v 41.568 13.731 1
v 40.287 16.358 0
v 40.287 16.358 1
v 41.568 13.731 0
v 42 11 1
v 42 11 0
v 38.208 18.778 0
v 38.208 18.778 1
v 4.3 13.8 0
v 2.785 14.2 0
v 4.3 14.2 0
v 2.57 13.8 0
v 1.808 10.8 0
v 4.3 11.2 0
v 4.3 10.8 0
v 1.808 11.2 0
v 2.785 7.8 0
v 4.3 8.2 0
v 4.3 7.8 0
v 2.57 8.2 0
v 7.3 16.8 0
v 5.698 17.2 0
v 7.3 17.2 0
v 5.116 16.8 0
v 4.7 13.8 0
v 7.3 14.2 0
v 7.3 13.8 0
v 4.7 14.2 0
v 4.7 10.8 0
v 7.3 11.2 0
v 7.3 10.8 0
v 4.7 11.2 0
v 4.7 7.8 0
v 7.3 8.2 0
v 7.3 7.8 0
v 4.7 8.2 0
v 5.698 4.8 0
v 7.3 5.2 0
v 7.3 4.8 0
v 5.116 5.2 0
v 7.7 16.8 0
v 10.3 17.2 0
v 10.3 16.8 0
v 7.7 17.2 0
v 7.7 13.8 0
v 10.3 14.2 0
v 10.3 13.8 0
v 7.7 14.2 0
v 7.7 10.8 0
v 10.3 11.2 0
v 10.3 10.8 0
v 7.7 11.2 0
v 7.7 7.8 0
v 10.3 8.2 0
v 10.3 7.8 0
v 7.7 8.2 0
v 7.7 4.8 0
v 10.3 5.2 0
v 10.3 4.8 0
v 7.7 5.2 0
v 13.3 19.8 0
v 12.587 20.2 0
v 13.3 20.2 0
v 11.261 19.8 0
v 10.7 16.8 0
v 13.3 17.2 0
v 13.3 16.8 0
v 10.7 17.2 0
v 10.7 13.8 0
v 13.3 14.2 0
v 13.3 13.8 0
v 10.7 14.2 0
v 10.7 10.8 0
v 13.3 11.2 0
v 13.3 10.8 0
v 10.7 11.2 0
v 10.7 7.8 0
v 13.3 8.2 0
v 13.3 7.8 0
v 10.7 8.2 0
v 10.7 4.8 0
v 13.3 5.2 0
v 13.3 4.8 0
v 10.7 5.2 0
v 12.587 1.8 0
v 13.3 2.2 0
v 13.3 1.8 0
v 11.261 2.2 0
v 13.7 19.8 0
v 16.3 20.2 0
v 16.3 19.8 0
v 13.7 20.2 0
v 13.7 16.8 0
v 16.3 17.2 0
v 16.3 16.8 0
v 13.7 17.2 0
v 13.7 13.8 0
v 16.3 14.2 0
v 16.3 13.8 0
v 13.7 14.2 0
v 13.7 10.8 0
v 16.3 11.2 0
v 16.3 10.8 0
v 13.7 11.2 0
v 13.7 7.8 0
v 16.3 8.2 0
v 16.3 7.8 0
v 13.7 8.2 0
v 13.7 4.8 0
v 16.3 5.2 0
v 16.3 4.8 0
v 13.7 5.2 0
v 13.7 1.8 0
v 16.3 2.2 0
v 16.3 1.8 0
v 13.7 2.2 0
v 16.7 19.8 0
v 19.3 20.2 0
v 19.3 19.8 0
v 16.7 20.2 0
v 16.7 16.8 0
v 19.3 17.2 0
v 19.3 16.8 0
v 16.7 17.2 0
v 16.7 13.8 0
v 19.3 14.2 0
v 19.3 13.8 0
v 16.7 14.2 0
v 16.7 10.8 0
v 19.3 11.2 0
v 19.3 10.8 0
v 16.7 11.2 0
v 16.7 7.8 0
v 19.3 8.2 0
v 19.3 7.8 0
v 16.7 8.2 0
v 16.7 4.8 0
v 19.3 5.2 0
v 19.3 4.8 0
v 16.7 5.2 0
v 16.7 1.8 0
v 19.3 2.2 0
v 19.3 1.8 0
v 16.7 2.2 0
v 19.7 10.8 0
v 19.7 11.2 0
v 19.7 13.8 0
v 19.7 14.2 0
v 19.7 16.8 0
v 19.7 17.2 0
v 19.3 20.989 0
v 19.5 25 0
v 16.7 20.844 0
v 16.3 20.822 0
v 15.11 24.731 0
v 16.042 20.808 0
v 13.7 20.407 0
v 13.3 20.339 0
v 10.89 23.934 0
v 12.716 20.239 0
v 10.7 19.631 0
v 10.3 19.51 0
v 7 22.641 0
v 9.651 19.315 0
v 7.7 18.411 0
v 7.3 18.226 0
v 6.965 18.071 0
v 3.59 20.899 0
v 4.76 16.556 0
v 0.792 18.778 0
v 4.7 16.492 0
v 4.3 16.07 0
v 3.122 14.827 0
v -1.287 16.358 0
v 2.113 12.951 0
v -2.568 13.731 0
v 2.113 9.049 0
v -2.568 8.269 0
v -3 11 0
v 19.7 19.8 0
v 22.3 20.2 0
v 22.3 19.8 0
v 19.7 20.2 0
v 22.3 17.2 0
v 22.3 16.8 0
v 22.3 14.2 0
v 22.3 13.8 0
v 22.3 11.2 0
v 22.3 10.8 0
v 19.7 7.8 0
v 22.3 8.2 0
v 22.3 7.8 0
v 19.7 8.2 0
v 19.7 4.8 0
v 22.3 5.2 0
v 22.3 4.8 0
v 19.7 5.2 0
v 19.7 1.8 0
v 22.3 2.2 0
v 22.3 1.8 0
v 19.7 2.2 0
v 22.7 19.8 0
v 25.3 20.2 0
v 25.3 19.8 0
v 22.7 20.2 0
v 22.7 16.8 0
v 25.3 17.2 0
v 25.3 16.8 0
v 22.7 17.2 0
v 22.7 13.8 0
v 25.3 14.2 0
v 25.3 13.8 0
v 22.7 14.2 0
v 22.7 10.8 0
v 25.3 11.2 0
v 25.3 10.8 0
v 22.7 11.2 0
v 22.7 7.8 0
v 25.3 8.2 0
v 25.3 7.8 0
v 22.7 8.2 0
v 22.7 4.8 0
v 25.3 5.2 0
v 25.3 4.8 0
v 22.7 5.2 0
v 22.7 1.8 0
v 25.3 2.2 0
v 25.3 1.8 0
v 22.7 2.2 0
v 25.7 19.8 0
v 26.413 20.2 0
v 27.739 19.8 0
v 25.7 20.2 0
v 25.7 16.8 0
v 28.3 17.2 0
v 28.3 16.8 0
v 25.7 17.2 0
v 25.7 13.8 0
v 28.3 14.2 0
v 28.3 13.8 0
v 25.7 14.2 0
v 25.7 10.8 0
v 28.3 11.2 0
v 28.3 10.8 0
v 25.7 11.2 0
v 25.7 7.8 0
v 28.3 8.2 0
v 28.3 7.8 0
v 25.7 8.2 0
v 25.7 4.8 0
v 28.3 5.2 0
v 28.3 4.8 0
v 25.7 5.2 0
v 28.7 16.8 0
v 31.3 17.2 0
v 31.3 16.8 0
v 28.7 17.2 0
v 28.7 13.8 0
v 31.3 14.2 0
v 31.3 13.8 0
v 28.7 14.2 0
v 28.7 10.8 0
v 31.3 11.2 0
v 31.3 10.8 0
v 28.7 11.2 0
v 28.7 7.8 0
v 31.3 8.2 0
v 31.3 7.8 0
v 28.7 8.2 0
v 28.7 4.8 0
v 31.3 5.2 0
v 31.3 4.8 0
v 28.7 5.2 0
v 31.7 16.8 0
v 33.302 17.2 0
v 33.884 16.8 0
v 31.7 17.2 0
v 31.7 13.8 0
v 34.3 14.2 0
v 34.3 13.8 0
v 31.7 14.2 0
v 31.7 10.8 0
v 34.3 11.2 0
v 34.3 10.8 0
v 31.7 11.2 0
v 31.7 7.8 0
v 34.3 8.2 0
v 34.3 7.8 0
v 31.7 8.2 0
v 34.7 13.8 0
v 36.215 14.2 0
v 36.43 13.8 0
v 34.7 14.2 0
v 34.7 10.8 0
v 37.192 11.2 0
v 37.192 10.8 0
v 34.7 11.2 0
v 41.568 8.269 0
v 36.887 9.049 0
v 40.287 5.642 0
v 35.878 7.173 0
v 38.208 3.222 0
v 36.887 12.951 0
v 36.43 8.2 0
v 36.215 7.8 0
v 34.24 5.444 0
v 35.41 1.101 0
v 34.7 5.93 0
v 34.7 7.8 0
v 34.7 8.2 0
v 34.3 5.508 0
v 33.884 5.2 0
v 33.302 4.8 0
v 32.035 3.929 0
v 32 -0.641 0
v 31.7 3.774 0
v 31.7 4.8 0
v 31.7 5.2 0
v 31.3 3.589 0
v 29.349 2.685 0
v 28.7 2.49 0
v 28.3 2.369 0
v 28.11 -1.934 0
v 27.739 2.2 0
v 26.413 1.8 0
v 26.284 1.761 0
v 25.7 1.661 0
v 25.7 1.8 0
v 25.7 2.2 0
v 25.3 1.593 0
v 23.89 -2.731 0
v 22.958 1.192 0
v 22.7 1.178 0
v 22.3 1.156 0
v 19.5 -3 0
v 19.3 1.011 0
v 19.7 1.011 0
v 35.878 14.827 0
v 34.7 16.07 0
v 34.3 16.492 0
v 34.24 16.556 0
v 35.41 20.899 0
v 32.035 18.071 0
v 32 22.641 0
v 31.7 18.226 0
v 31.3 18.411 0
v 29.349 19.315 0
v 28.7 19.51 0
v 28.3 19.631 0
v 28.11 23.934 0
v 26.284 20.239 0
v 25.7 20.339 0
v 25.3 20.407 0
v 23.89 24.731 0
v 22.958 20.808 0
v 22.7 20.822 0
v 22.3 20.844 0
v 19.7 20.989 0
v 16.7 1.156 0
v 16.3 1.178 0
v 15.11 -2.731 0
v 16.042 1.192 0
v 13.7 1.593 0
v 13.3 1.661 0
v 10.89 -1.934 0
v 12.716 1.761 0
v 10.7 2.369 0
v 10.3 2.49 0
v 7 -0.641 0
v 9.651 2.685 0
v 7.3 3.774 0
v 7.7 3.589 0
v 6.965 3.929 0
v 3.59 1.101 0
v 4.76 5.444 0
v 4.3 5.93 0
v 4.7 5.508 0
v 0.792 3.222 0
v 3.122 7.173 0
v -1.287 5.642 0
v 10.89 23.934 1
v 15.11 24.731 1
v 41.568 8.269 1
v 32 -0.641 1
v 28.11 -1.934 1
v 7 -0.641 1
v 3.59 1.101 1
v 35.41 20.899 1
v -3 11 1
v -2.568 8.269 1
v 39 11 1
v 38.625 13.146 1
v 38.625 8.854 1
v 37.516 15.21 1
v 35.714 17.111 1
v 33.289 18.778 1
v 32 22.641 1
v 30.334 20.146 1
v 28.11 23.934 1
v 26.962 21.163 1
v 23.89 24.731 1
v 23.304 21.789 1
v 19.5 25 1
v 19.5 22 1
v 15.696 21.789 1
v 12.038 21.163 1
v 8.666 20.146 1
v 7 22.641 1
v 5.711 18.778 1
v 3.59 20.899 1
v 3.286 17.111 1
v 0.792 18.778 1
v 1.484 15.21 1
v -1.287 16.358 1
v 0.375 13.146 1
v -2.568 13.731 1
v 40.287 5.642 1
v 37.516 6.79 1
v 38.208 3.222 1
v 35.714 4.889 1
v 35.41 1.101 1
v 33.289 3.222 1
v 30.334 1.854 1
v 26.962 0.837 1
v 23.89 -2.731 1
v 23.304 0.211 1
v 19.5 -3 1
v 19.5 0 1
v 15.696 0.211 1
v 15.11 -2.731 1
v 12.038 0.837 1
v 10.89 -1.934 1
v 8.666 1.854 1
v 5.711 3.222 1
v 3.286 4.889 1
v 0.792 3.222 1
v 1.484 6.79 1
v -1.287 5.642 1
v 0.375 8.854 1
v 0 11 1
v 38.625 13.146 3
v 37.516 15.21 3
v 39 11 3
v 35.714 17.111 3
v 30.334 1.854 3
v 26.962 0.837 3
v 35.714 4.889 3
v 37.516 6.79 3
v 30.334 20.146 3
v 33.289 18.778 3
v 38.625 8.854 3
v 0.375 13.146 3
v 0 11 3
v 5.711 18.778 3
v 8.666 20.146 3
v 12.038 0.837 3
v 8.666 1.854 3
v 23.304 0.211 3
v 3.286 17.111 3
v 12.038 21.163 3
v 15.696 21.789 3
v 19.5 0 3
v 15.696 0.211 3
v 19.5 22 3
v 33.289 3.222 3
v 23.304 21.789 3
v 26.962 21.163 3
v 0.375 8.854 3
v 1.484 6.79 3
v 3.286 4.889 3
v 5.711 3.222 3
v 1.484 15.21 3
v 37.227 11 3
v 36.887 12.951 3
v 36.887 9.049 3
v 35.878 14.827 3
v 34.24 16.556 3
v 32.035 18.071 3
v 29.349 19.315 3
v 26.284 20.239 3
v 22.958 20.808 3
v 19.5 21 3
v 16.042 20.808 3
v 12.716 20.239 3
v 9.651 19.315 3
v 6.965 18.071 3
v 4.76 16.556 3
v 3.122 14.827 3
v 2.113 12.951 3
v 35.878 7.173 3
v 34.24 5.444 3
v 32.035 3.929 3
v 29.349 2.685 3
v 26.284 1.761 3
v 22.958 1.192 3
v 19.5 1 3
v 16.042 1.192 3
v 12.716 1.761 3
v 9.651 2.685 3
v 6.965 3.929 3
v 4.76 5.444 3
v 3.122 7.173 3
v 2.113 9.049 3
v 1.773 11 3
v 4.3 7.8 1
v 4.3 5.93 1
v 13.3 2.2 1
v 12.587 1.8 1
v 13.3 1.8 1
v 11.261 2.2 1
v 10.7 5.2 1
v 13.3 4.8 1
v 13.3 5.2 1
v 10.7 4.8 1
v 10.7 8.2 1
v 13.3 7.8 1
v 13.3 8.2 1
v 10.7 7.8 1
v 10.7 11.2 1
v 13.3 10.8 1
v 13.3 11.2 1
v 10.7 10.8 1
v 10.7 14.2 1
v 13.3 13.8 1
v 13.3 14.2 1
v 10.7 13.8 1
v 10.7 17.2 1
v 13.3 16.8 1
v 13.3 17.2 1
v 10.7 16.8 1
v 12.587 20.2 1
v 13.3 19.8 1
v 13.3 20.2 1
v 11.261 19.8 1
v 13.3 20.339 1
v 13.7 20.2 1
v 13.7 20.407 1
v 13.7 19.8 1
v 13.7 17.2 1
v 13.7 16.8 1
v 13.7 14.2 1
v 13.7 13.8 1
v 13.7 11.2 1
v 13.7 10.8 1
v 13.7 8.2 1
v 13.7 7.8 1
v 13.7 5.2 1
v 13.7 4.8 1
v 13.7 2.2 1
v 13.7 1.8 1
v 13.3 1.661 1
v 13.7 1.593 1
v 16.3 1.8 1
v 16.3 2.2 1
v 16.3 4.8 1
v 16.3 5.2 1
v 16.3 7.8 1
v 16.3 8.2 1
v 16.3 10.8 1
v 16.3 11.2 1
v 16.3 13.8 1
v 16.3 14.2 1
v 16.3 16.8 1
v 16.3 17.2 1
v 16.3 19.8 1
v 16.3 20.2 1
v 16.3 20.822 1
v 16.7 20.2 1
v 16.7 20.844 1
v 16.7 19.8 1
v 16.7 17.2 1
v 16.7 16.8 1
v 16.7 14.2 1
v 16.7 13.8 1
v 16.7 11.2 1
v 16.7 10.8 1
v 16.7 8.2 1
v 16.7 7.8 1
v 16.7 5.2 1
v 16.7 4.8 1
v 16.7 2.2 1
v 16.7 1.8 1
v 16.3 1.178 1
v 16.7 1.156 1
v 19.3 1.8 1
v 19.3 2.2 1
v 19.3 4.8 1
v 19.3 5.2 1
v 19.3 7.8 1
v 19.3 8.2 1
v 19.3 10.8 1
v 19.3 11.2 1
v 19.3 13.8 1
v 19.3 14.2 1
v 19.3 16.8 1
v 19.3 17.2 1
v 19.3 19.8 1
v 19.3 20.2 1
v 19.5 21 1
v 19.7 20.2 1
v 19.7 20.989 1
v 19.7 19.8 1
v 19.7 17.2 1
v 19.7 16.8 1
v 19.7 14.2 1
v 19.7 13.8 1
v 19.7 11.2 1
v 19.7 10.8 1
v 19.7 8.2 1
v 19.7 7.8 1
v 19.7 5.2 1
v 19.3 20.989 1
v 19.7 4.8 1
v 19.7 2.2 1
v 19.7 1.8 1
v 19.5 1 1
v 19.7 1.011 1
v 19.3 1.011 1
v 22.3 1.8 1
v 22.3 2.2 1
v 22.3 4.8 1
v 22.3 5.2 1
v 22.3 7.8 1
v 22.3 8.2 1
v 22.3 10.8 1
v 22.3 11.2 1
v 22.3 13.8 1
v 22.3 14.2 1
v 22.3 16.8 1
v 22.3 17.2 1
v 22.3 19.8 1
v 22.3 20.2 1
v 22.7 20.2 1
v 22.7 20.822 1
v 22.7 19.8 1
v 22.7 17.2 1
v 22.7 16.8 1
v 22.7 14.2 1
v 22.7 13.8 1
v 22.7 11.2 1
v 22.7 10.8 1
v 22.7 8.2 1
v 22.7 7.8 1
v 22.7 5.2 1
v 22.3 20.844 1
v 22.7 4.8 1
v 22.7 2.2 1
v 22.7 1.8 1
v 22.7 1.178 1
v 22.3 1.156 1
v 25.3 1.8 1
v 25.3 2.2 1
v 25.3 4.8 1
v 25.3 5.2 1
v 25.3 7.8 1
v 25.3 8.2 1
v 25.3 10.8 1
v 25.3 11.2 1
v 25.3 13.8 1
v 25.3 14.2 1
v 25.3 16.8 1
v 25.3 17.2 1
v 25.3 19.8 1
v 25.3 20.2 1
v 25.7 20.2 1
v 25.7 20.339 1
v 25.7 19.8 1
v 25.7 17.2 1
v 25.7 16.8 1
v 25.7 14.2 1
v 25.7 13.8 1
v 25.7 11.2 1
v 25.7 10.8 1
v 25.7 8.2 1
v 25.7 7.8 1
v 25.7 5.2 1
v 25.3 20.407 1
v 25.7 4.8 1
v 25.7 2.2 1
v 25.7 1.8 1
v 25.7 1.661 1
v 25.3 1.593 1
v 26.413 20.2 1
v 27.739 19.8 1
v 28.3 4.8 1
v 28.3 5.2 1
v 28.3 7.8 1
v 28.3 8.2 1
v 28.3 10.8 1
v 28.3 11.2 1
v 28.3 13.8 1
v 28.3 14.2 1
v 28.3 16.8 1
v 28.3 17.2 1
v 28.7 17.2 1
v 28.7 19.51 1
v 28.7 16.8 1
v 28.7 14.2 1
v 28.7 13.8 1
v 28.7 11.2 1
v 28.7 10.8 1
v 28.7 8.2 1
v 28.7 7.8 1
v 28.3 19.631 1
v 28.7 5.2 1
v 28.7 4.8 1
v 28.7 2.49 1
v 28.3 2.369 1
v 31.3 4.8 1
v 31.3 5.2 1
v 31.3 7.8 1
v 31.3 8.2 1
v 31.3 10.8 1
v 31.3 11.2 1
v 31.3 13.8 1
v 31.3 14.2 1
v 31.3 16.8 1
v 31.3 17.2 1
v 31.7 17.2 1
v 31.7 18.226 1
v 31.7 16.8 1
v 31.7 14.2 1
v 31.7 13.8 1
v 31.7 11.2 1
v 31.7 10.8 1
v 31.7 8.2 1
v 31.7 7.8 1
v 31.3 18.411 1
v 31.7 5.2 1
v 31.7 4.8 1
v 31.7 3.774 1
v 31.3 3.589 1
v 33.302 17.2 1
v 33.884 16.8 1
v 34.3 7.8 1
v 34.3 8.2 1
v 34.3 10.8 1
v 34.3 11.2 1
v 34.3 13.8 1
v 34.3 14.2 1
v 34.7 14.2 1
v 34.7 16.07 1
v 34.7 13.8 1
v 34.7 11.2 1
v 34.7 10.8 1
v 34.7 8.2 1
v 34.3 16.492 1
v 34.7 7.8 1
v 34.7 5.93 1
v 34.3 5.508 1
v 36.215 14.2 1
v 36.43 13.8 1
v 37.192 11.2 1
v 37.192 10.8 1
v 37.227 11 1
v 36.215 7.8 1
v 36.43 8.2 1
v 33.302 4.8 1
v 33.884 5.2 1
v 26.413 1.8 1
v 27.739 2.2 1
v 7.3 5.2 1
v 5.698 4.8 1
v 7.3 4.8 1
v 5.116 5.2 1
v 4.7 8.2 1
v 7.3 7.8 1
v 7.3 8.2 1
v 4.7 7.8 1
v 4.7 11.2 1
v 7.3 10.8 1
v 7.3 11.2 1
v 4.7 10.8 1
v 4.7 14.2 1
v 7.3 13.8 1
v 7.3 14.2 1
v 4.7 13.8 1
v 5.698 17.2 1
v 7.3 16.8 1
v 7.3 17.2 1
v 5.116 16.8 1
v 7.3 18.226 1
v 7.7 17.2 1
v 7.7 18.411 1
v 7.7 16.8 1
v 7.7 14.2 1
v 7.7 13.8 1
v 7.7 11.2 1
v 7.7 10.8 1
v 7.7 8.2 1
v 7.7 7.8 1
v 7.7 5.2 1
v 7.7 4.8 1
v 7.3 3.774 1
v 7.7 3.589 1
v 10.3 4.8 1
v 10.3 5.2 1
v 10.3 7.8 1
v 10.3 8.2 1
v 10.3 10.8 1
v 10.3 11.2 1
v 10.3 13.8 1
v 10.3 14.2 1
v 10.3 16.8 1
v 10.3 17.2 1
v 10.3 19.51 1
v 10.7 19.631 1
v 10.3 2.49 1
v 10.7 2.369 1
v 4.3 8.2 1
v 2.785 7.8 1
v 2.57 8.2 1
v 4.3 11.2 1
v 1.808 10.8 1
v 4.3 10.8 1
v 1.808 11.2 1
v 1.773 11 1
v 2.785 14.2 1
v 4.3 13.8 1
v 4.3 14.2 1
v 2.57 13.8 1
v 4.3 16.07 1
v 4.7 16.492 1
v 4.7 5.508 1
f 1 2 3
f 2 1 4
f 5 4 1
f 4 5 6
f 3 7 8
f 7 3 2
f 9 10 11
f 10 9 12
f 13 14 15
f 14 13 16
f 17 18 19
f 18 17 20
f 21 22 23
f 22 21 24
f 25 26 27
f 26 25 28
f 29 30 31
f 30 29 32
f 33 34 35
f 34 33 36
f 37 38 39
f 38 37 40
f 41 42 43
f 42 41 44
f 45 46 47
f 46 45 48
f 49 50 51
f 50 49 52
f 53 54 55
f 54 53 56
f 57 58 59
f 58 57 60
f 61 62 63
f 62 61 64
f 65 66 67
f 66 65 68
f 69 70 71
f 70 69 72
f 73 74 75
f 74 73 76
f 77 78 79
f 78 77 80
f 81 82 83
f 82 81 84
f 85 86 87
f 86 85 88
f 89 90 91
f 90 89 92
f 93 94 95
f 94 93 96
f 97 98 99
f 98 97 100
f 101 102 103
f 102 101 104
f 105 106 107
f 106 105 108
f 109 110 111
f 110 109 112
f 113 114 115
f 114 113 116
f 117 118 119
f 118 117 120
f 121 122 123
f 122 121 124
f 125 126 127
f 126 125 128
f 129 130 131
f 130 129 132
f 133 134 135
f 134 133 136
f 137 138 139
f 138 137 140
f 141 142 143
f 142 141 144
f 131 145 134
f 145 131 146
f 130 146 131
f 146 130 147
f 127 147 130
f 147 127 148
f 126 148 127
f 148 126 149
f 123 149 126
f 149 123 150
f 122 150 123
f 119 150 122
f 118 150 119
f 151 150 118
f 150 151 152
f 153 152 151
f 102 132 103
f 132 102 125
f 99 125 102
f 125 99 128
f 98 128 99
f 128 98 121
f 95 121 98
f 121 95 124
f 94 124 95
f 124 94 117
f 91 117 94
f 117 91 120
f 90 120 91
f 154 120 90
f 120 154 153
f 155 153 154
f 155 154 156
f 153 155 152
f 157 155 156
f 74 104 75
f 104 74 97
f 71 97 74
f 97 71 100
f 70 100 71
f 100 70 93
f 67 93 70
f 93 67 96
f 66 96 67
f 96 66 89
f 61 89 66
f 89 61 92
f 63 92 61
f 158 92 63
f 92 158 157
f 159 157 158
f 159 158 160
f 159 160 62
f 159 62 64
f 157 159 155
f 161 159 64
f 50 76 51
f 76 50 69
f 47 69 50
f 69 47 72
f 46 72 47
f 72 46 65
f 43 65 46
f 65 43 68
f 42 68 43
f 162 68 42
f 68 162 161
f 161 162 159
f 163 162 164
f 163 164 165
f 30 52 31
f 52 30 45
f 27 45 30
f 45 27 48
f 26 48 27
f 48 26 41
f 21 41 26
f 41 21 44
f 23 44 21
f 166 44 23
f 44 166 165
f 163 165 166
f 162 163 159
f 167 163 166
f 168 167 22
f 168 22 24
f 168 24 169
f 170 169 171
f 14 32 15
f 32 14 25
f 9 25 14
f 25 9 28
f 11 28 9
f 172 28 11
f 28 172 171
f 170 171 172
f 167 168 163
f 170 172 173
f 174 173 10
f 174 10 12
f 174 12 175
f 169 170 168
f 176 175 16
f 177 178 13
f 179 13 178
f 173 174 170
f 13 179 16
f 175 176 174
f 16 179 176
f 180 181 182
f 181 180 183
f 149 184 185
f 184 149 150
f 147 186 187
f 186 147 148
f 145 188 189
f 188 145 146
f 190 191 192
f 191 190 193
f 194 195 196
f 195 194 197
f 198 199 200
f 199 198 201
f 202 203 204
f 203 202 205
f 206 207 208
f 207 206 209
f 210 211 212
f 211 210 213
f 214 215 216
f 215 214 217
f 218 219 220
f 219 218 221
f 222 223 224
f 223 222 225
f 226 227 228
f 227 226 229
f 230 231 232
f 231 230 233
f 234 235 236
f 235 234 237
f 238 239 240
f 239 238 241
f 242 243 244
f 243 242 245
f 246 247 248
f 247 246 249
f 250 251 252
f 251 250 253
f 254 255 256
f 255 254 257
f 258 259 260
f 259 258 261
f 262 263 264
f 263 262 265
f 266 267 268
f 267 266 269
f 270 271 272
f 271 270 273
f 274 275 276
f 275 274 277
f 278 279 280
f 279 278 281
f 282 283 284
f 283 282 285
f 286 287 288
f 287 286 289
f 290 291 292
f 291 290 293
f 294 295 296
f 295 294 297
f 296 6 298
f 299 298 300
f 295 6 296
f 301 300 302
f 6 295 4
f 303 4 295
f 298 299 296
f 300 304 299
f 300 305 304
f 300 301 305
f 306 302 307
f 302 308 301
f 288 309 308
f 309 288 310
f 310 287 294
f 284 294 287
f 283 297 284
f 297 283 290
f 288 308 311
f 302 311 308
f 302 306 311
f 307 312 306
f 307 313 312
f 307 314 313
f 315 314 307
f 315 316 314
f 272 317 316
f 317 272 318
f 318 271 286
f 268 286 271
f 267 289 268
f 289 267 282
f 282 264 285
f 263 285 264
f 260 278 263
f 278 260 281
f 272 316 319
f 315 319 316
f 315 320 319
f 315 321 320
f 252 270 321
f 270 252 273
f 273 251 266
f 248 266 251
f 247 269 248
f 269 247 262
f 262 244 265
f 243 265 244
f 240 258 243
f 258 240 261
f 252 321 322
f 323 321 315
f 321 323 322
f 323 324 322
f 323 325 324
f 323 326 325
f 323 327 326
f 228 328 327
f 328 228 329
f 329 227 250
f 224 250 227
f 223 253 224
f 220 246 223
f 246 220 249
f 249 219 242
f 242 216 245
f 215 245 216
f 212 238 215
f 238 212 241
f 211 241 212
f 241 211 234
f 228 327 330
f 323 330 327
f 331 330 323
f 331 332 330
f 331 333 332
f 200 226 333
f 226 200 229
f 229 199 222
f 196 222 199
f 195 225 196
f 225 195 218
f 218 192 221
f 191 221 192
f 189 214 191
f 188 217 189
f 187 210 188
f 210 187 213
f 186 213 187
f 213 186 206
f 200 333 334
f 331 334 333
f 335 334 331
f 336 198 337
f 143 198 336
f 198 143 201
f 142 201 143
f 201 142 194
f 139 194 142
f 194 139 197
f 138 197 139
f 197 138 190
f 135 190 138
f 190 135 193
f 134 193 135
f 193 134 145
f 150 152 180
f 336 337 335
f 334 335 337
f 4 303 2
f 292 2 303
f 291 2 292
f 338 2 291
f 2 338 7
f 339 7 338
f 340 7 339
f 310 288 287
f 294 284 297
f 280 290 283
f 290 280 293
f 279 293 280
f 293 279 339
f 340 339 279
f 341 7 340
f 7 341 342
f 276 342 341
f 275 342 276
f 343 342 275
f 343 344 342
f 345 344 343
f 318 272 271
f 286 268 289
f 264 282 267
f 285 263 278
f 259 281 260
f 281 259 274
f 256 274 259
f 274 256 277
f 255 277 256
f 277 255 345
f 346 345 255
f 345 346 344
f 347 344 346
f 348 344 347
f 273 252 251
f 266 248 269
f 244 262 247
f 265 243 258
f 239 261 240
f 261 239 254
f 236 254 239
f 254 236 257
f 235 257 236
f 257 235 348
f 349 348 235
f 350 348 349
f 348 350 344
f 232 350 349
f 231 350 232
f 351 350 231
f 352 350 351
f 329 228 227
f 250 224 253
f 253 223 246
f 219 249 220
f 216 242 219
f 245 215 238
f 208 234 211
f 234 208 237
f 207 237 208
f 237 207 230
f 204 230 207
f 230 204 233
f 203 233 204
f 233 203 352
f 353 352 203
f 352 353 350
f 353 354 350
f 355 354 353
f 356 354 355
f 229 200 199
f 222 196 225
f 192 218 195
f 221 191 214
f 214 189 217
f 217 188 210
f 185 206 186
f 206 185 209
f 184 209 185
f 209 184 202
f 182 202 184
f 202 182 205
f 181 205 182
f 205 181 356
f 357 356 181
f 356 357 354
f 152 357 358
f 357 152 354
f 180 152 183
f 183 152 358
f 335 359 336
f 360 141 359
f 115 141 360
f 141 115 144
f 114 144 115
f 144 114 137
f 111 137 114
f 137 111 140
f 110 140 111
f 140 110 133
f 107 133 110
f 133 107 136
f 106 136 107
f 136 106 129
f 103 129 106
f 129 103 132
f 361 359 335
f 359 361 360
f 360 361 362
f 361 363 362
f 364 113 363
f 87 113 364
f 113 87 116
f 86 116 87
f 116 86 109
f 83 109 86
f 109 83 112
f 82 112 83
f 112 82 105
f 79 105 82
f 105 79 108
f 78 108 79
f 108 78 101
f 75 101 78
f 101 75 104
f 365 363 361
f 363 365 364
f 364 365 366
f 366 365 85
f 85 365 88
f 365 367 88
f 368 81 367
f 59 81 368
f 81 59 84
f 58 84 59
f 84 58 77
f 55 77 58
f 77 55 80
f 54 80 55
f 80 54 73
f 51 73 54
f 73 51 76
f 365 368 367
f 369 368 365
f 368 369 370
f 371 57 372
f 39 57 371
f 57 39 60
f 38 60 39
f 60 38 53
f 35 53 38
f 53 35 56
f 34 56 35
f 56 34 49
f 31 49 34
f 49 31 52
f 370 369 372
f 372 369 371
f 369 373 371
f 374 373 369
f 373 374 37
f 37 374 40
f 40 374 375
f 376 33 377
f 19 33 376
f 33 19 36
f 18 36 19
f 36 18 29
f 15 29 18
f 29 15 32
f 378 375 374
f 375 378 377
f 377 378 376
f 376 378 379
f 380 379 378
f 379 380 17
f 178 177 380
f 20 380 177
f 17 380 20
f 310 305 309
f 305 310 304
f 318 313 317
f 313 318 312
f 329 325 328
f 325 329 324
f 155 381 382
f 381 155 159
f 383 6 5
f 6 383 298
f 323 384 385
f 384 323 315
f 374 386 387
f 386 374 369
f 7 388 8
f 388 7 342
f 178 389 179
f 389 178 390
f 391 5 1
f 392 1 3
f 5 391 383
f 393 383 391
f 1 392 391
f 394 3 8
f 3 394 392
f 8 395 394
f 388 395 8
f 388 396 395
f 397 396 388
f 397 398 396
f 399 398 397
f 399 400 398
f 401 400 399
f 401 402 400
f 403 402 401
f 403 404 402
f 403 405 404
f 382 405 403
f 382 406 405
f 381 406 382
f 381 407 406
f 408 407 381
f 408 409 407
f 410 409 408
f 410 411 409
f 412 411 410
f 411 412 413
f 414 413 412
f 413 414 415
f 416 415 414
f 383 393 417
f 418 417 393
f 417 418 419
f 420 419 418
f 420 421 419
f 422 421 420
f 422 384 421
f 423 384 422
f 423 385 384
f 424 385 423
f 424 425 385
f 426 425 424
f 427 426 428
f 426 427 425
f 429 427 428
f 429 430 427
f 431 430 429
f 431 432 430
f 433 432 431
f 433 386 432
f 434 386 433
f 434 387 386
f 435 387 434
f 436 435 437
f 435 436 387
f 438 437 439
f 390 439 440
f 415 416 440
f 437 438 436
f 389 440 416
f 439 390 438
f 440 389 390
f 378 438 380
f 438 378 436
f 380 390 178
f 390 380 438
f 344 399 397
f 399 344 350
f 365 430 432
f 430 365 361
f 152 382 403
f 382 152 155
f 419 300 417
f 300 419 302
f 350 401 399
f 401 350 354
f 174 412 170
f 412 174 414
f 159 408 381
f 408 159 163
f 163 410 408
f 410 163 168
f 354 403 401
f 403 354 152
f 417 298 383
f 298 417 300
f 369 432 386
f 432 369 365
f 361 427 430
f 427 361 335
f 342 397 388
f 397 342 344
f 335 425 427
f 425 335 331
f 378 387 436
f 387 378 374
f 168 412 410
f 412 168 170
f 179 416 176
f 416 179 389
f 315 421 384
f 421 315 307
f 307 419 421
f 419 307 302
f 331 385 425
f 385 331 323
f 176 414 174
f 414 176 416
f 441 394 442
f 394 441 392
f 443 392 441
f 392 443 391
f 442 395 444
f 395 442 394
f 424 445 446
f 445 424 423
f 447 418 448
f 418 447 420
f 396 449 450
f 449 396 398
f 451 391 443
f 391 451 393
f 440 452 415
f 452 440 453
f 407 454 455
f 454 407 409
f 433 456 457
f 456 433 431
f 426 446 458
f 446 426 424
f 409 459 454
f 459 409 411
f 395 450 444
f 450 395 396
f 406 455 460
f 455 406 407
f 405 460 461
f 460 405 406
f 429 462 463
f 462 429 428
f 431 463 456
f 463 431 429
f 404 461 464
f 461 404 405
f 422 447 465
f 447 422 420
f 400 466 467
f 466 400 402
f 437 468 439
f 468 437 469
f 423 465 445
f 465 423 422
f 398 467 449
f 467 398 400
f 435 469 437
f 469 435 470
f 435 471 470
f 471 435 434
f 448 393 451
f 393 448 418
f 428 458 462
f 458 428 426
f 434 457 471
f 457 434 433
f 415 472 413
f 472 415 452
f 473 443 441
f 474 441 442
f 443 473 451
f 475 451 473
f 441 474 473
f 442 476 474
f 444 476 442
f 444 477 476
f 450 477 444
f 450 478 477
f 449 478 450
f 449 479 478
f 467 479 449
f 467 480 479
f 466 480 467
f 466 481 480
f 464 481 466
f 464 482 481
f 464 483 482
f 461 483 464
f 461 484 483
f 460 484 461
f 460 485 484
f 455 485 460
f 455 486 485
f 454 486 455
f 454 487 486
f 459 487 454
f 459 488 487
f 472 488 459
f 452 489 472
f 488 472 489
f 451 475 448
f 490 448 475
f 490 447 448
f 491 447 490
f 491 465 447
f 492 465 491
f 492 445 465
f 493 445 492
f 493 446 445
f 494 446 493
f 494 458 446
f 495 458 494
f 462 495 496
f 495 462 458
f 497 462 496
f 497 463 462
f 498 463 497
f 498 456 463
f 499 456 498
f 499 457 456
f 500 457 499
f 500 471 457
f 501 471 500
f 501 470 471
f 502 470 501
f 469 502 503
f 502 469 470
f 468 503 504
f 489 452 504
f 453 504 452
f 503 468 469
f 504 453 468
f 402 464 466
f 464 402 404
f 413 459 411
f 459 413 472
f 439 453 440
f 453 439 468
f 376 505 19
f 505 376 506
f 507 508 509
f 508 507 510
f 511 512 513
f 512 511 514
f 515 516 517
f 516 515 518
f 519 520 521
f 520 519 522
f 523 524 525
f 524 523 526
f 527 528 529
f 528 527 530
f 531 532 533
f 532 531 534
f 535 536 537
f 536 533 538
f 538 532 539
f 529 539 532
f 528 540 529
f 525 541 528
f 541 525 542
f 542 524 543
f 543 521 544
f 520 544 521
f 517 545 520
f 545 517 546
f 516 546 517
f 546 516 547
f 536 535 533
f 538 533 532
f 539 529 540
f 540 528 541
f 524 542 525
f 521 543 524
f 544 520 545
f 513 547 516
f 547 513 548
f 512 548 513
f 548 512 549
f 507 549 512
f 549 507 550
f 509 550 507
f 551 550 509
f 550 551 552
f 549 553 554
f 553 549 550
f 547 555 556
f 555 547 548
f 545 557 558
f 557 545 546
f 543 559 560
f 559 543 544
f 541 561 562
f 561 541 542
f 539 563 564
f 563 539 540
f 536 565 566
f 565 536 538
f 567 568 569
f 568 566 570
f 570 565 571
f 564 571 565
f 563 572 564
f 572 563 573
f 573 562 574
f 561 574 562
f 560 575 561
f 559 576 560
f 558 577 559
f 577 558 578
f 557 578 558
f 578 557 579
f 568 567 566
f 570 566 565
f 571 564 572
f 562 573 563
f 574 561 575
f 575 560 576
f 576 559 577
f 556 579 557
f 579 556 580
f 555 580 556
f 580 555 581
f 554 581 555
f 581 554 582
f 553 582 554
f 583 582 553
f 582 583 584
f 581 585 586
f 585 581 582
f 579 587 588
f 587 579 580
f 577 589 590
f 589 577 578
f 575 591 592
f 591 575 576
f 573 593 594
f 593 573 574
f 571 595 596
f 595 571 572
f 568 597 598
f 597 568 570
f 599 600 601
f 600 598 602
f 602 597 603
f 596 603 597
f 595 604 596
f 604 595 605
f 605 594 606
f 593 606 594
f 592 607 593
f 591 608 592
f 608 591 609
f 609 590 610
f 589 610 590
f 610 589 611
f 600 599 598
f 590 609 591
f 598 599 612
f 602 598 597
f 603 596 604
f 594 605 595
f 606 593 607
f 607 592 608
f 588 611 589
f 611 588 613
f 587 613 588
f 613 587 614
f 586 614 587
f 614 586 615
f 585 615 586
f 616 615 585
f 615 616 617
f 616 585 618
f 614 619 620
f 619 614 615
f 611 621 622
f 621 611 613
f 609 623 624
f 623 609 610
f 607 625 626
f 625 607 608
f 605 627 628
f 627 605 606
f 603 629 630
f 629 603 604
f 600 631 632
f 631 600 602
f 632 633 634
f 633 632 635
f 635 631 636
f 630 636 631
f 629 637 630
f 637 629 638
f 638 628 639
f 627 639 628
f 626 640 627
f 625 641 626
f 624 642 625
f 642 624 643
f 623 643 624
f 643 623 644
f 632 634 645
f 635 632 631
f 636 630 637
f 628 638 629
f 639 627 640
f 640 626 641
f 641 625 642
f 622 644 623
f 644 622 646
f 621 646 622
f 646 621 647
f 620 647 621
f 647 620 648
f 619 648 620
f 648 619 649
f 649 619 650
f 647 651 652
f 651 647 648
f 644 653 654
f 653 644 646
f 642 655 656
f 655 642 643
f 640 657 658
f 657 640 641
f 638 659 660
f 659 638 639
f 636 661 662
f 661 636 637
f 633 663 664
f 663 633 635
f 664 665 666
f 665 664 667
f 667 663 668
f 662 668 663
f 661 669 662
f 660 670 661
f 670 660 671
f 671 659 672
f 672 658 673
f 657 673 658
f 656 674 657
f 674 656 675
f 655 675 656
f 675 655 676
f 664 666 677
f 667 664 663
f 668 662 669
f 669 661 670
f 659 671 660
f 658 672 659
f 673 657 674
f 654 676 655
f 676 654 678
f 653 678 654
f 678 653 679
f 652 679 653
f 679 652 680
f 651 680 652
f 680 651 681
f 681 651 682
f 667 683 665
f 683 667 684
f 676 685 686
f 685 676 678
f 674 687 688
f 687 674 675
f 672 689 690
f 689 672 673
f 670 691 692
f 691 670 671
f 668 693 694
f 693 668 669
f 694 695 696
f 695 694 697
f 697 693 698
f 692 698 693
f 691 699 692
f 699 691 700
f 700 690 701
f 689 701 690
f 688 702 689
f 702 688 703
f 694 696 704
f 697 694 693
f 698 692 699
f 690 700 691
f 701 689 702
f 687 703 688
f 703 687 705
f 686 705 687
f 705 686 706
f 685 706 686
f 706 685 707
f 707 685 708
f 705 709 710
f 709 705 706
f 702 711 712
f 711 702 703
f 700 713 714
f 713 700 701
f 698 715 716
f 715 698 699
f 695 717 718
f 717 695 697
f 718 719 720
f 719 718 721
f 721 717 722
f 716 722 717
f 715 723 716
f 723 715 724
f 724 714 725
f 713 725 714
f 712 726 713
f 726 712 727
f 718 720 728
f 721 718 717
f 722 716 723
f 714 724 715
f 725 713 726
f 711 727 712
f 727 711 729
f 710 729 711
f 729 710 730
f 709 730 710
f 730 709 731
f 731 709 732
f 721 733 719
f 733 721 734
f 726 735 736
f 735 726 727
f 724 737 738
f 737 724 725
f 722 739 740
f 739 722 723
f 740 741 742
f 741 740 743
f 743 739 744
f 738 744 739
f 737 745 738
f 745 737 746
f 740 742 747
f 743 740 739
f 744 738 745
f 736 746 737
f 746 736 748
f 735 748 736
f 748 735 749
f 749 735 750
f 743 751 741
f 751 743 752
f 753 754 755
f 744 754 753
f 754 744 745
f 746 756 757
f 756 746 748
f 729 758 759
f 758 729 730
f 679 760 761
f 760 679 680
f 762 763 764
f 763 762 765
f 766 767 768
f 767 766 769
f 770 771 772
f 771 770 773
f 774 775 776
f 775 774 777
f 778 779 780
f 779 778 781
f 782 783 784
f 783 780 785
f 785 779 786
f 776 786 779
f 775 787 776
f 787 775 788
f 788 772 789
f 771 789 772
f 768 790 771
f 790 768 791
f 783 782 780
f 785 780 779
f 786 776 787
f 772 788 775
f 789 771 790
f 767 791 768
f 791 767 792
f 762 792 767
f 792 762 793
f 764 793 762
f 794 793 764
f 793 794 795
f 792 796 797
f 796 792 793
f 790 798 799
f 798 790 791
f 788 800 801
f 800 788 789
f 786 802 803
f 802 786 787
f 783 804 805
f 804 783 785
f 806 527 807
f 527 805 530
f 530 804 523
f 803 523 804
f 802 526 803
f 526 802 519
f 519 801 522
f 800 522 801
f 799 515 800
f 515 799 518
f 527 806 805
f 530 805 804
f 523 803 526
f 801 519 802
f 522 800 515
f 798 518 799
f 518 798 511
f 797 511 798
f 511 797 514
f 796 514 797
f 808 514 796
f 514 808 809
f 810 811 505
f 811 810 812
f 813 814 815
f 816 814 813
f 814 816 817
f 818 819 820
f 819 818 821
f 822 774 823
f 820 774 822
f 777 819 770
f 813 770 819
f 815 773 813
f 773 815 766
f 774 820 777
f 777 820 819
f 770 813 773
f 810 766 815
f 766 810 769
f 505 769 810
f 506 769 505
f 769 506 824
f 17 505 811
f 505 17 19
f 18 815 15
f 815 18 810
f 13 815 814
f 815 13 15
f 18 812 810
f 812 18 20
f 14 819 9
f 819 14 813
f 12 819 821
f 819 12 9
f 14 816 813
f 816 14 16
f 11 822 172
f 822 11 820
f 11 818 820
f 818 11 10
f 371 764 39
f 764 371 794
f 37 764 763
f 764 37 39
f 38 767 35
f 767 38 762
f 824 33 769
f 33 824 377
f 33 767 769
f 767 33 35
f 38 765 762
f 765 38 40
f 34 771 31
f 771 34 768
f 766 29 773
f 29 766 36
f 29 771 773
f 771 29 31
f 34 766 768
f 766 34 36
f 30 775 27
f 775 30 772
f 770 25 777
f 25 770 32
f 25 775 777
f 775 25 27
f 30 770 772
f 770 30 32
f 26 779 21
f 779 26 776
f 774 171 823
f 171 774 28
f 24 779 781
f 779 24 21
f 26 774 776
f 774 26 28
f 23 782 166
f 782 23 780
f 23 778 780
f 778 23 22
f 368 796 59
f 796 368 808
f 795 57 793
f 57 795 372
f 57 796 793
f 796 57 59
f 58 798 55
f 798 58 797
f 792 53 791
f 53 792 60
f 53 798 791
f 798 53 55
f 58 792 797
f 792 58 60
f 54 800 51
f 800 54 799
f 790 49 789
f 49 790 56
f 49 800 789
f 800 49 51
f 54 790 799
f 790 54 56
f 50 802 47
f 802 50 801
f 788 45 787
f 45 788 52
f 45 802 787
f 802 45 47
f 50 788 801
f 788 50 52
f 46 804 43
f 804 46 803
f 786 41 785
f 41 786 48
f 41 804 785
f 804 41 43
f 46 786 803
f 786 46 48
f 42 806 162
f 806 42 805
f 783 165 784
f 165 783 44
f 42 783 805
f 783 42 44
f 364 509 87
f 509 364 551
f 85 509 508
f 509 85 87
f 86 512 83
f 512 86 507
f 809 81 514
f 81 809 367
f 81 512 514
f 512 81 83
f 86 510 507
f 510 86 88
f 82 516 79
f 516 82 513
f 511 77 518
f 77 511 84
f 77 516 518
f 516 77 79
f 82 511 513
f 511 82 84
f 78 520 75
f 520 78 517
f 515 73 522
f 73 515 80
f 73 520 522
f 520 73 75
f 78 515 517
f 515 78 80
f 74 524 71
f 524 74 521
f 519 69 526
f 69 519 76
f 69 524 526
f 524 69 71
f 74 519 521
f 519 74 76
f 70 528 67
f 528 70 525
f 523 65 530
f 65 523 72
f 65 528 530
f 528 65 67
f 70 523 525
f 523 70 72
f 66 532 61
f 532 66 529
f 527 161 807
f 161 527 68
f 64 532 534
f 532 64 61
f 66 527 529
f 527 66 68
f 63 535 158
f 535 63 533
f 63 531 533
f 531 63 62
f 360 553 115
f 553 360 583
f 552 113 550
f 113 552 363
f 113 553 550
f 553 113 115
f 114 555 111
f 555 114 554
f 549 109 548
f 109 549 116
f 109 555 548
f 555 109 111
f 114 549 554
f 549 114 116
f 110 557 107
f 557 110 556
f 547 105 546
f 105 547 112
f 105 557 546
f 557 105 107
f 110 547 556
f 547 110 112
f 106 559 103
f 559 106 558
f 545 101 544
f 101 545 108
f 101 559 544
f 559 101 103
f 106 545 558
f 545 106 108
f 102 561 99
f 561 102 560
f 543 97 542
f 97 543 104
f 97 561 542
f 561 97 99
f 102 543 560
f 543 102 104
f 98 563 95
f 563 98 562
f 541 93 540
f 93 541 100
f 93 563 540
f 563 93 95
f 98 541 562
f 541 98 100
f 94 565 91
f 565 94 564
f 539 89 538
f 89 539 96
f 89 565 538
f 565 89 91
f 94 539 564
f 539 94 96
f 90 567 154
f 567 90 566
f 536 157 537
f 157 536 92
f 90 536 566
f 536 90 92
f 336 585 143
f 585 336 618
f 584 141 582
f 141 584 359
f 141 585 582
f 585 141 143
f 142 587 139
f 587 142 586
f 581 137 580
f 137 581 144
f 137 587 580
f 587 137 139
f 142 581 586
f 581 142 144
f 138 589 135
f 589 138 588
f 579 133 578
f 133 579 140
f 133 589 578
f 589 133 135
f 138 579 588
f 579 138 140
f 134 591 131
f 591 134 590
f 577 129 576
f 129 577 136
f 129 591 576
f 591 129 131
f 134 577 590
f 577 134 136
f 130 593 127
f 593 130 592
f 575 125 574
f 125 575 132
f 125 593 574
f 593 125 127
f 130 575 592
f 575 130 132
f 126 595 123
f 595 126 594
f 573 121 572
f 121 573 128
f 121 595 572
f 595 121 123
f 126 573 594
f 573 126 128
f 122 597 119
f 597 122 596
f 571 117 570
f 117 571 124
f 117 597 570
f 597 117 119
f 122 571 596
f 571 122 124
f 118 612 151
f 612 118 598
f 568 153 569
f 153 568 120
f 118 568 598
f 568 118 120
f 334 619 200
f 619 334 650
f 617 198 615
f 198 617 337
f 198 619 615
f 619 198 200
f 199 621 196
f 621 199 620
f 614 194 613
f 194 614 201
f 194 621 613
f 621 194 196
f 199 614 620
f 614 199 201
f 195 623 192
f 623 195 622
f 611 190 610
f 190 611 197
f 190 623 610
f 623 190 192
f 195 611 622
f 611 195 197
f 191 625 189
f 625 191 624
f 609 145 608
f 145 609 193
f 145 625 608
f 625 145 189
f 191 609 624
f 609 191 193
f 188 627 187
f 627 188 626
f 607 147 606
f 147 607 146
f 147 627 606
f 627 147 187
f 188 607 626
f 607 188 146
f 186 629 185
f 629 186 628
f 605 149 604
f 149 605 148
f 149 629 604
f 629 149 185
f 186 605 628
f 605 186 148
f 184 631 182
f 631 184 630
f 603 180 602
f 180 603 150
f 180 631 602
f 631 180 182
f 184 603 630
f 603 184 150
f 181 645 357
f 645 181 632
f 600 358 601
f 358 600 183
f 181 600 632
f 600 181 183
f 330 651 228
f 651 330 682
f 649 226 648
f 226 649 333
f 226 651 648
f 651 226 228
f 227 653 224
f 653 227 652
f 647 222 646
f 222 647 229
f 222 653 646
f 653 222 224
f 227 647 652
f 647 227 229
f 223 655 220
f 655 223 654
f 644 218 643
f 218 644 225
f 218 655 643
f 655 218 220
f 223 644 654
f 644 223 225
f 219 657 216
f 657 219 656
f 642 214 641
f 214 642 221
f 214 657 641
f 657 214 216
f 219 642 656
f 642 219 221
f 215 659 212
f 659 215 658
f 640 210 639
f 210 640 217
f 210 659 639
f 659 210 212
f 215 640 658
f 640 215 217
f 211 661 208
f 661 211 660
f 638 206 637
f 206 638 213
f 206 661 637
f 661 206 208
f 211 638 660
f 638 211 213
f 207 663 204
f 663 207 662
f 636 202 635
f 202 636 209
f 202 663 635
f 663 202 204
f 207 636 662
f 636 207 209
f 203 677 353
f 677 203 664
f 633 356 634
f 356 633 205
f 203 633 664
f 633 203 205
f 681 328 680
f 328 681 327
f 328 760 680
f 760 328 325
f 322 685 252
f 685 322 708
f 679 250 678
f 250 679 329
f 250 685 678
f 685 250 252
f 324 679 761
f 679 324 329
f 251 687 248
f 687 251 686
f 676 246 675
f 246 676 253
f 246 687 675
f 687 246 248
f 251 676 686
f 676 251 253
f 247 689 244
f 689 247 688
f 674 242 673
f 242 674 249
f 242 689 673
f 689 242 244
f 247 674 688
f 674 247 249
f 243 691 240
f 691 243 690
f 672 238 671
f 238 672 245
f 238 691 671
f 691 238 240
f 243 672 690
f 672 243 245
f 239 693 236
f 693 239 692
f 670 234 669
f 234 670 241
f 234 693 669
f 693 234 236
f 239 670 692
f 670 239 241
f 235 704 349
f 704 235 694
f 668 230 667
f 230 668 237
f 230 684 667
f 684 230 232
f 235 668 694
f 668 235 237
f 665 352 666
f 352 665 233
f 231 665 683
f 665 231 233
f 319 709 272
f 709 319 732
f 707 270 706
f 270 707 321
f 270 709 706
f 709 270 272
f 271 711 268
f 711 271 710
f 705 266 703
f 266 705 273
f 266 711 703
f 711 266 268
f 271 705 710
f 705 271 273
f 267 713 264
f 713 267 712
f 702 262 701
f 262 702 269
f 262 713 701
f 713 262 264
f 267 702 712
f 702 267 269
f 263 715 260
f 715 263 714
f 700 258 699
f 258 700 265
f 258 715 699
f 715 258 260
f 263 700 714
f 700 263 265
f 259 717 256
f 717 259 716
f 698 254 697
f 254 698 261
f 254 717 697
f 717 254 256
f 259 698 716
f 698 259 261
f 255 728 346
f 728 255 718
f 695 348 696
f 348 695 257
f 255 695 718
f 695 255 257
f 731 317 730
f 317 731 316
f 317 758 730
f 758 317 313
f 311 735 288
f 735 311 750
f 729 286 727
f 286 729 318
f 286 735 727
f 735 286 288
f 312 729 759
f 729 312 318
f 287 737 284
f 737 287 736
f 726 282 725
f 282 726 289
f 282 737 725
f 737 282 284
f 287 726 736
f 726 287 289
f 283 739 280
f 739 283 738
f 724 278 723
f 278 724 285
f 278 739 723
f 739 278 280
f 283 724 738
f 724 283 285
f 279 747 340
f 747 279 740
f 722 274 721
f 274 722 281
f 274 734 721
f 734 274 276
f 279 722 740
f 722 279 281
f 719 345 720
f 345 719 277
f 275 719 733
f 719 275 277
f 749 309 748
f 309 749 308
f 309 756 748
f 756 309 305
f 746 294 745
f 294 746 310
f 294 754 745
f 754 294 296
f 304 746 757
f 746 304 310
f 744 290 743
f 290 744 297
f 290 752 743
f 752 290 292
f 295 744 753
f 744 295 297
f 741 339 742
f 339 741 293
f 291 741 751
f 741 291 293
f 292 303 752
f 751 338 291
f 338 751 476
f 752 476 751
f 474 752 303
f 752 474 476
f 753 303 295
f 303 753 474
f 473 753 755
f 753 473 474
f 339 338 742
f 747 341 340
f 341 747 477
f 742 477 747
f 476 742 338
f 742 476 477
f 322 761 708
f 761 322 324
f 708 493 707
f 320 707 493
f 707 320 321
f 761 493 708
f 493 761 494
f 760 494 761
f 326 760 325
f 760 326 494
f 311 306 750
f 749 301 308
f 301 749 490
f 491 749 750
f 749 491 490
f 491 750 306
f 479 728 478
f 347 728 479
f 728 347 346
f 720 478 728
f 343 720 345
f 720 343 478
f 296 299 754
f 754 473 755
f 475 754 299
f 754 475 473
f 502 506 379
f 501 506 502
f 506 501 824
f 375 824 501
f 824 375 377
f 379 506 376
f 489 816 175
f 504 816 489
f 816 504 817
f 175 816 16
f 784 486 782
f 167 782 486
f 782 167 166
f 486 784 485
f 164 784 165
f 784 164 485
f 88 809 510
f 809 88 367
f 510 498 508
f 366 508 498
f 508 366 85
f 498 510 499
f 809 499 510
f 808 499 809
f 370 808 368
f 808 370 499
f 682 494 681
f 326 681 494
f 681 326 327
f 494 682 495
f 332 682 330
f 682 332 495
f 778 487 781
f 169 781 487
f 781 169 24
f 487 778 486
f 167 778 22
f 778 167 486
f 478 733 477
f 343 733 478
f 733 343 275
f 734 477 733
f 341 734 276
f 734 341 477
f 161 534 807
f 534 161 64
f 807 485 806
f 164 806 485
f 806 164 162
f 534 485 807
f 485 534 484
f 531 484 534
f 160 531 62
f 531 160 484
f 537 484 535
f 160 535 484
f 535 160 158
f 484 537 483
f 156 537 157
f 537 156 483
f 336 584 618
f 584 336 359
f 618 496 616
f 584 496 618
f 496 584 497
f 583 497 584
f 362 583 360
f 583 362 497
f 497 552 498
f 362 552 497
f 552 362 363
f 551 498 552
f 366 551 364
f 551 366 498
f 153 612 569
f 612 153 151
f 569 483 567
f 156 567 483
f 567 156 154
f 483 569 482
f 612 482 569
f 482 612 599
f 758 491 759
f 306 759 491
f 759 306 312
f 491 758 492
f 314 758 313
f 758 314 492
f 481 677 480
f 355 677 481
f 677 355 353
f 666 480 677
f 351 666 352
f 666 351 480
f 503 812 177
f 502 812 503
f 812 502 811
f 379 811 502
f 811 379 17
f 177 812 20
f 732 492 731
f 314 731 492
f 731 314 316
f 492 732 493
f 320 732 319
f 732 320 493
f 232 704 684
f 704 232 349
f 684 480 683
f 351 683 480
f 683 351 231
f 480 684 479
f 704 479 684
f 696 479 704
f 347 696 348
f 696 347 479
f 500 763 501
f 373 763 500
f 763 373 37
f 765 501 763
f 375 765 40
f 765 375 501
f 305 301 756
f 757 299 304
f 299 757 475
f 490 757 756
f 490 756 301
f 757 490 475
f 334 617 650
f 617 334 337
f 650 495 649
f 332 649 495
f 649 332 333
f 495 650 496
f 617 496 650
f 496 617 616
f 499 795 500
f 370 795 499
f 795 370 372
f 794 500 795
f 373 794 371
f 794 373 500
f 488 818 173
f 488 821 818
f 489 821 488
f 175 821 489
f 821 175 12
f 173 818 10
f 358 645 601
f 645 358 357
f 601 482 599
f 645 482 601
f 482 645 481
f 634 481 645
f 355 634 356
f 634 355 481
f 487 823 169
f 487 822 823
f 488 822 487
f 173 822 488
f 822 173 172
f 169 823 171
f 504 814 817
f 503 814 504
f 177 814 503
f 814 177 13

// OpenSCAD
$fn = 32;
module drain(
diameterx = 39,
diametery = 22,
thickness = 2,
drop_height = 2,
outline_width = 3,
hole_distance = 36/12,
hole_diameter = 2.6
){
	difference(){
		union(){
			translate([ diameterx/2, diametery/2, 0]){
				scale([( 2*outline_width + diameterx)/( 2* outline_width +  diametery), 1, 1]){
					cylinder( thickness/2 , diametery/2  + outline_width, diametery/2 + outline_width);
				}
			}
			translate([ diameterx/2, diametery/2, thickness/2]){
				scale([ diameterx/diametery, 1, 1]){
					cylinder( drop_height , diametery/2, diametery/2);
				}
			}
		}
		union(){
			translate([ diameterx/2, diametery/2, thickness/2]){
				scale([ diameterx/diametery, 1, 1]){
					cylinder( drop_height , ( diametery - thickness)/2, ( diametery - thickness)/2);
				}
			}
			intersection(){
				translate([ diameterx/2, diametery/2, 0]){
					scale([ diameterx/diametery, 1, 1]){
						cylinder( thickness/2 , ( diametery - thickness)/2, ( diametery - thickness)/2);
					}
				}
				for(x = [0:hole_distance:diameterx]){
					for(y = [1:hole_distance:diametery]){
						translate([x-1.3,y-1.8,0]){
							cube([hole_diameter, hole_diameter, thickness/2]);
						}
					}
				}
			}
		} 
	}
}

drain();
